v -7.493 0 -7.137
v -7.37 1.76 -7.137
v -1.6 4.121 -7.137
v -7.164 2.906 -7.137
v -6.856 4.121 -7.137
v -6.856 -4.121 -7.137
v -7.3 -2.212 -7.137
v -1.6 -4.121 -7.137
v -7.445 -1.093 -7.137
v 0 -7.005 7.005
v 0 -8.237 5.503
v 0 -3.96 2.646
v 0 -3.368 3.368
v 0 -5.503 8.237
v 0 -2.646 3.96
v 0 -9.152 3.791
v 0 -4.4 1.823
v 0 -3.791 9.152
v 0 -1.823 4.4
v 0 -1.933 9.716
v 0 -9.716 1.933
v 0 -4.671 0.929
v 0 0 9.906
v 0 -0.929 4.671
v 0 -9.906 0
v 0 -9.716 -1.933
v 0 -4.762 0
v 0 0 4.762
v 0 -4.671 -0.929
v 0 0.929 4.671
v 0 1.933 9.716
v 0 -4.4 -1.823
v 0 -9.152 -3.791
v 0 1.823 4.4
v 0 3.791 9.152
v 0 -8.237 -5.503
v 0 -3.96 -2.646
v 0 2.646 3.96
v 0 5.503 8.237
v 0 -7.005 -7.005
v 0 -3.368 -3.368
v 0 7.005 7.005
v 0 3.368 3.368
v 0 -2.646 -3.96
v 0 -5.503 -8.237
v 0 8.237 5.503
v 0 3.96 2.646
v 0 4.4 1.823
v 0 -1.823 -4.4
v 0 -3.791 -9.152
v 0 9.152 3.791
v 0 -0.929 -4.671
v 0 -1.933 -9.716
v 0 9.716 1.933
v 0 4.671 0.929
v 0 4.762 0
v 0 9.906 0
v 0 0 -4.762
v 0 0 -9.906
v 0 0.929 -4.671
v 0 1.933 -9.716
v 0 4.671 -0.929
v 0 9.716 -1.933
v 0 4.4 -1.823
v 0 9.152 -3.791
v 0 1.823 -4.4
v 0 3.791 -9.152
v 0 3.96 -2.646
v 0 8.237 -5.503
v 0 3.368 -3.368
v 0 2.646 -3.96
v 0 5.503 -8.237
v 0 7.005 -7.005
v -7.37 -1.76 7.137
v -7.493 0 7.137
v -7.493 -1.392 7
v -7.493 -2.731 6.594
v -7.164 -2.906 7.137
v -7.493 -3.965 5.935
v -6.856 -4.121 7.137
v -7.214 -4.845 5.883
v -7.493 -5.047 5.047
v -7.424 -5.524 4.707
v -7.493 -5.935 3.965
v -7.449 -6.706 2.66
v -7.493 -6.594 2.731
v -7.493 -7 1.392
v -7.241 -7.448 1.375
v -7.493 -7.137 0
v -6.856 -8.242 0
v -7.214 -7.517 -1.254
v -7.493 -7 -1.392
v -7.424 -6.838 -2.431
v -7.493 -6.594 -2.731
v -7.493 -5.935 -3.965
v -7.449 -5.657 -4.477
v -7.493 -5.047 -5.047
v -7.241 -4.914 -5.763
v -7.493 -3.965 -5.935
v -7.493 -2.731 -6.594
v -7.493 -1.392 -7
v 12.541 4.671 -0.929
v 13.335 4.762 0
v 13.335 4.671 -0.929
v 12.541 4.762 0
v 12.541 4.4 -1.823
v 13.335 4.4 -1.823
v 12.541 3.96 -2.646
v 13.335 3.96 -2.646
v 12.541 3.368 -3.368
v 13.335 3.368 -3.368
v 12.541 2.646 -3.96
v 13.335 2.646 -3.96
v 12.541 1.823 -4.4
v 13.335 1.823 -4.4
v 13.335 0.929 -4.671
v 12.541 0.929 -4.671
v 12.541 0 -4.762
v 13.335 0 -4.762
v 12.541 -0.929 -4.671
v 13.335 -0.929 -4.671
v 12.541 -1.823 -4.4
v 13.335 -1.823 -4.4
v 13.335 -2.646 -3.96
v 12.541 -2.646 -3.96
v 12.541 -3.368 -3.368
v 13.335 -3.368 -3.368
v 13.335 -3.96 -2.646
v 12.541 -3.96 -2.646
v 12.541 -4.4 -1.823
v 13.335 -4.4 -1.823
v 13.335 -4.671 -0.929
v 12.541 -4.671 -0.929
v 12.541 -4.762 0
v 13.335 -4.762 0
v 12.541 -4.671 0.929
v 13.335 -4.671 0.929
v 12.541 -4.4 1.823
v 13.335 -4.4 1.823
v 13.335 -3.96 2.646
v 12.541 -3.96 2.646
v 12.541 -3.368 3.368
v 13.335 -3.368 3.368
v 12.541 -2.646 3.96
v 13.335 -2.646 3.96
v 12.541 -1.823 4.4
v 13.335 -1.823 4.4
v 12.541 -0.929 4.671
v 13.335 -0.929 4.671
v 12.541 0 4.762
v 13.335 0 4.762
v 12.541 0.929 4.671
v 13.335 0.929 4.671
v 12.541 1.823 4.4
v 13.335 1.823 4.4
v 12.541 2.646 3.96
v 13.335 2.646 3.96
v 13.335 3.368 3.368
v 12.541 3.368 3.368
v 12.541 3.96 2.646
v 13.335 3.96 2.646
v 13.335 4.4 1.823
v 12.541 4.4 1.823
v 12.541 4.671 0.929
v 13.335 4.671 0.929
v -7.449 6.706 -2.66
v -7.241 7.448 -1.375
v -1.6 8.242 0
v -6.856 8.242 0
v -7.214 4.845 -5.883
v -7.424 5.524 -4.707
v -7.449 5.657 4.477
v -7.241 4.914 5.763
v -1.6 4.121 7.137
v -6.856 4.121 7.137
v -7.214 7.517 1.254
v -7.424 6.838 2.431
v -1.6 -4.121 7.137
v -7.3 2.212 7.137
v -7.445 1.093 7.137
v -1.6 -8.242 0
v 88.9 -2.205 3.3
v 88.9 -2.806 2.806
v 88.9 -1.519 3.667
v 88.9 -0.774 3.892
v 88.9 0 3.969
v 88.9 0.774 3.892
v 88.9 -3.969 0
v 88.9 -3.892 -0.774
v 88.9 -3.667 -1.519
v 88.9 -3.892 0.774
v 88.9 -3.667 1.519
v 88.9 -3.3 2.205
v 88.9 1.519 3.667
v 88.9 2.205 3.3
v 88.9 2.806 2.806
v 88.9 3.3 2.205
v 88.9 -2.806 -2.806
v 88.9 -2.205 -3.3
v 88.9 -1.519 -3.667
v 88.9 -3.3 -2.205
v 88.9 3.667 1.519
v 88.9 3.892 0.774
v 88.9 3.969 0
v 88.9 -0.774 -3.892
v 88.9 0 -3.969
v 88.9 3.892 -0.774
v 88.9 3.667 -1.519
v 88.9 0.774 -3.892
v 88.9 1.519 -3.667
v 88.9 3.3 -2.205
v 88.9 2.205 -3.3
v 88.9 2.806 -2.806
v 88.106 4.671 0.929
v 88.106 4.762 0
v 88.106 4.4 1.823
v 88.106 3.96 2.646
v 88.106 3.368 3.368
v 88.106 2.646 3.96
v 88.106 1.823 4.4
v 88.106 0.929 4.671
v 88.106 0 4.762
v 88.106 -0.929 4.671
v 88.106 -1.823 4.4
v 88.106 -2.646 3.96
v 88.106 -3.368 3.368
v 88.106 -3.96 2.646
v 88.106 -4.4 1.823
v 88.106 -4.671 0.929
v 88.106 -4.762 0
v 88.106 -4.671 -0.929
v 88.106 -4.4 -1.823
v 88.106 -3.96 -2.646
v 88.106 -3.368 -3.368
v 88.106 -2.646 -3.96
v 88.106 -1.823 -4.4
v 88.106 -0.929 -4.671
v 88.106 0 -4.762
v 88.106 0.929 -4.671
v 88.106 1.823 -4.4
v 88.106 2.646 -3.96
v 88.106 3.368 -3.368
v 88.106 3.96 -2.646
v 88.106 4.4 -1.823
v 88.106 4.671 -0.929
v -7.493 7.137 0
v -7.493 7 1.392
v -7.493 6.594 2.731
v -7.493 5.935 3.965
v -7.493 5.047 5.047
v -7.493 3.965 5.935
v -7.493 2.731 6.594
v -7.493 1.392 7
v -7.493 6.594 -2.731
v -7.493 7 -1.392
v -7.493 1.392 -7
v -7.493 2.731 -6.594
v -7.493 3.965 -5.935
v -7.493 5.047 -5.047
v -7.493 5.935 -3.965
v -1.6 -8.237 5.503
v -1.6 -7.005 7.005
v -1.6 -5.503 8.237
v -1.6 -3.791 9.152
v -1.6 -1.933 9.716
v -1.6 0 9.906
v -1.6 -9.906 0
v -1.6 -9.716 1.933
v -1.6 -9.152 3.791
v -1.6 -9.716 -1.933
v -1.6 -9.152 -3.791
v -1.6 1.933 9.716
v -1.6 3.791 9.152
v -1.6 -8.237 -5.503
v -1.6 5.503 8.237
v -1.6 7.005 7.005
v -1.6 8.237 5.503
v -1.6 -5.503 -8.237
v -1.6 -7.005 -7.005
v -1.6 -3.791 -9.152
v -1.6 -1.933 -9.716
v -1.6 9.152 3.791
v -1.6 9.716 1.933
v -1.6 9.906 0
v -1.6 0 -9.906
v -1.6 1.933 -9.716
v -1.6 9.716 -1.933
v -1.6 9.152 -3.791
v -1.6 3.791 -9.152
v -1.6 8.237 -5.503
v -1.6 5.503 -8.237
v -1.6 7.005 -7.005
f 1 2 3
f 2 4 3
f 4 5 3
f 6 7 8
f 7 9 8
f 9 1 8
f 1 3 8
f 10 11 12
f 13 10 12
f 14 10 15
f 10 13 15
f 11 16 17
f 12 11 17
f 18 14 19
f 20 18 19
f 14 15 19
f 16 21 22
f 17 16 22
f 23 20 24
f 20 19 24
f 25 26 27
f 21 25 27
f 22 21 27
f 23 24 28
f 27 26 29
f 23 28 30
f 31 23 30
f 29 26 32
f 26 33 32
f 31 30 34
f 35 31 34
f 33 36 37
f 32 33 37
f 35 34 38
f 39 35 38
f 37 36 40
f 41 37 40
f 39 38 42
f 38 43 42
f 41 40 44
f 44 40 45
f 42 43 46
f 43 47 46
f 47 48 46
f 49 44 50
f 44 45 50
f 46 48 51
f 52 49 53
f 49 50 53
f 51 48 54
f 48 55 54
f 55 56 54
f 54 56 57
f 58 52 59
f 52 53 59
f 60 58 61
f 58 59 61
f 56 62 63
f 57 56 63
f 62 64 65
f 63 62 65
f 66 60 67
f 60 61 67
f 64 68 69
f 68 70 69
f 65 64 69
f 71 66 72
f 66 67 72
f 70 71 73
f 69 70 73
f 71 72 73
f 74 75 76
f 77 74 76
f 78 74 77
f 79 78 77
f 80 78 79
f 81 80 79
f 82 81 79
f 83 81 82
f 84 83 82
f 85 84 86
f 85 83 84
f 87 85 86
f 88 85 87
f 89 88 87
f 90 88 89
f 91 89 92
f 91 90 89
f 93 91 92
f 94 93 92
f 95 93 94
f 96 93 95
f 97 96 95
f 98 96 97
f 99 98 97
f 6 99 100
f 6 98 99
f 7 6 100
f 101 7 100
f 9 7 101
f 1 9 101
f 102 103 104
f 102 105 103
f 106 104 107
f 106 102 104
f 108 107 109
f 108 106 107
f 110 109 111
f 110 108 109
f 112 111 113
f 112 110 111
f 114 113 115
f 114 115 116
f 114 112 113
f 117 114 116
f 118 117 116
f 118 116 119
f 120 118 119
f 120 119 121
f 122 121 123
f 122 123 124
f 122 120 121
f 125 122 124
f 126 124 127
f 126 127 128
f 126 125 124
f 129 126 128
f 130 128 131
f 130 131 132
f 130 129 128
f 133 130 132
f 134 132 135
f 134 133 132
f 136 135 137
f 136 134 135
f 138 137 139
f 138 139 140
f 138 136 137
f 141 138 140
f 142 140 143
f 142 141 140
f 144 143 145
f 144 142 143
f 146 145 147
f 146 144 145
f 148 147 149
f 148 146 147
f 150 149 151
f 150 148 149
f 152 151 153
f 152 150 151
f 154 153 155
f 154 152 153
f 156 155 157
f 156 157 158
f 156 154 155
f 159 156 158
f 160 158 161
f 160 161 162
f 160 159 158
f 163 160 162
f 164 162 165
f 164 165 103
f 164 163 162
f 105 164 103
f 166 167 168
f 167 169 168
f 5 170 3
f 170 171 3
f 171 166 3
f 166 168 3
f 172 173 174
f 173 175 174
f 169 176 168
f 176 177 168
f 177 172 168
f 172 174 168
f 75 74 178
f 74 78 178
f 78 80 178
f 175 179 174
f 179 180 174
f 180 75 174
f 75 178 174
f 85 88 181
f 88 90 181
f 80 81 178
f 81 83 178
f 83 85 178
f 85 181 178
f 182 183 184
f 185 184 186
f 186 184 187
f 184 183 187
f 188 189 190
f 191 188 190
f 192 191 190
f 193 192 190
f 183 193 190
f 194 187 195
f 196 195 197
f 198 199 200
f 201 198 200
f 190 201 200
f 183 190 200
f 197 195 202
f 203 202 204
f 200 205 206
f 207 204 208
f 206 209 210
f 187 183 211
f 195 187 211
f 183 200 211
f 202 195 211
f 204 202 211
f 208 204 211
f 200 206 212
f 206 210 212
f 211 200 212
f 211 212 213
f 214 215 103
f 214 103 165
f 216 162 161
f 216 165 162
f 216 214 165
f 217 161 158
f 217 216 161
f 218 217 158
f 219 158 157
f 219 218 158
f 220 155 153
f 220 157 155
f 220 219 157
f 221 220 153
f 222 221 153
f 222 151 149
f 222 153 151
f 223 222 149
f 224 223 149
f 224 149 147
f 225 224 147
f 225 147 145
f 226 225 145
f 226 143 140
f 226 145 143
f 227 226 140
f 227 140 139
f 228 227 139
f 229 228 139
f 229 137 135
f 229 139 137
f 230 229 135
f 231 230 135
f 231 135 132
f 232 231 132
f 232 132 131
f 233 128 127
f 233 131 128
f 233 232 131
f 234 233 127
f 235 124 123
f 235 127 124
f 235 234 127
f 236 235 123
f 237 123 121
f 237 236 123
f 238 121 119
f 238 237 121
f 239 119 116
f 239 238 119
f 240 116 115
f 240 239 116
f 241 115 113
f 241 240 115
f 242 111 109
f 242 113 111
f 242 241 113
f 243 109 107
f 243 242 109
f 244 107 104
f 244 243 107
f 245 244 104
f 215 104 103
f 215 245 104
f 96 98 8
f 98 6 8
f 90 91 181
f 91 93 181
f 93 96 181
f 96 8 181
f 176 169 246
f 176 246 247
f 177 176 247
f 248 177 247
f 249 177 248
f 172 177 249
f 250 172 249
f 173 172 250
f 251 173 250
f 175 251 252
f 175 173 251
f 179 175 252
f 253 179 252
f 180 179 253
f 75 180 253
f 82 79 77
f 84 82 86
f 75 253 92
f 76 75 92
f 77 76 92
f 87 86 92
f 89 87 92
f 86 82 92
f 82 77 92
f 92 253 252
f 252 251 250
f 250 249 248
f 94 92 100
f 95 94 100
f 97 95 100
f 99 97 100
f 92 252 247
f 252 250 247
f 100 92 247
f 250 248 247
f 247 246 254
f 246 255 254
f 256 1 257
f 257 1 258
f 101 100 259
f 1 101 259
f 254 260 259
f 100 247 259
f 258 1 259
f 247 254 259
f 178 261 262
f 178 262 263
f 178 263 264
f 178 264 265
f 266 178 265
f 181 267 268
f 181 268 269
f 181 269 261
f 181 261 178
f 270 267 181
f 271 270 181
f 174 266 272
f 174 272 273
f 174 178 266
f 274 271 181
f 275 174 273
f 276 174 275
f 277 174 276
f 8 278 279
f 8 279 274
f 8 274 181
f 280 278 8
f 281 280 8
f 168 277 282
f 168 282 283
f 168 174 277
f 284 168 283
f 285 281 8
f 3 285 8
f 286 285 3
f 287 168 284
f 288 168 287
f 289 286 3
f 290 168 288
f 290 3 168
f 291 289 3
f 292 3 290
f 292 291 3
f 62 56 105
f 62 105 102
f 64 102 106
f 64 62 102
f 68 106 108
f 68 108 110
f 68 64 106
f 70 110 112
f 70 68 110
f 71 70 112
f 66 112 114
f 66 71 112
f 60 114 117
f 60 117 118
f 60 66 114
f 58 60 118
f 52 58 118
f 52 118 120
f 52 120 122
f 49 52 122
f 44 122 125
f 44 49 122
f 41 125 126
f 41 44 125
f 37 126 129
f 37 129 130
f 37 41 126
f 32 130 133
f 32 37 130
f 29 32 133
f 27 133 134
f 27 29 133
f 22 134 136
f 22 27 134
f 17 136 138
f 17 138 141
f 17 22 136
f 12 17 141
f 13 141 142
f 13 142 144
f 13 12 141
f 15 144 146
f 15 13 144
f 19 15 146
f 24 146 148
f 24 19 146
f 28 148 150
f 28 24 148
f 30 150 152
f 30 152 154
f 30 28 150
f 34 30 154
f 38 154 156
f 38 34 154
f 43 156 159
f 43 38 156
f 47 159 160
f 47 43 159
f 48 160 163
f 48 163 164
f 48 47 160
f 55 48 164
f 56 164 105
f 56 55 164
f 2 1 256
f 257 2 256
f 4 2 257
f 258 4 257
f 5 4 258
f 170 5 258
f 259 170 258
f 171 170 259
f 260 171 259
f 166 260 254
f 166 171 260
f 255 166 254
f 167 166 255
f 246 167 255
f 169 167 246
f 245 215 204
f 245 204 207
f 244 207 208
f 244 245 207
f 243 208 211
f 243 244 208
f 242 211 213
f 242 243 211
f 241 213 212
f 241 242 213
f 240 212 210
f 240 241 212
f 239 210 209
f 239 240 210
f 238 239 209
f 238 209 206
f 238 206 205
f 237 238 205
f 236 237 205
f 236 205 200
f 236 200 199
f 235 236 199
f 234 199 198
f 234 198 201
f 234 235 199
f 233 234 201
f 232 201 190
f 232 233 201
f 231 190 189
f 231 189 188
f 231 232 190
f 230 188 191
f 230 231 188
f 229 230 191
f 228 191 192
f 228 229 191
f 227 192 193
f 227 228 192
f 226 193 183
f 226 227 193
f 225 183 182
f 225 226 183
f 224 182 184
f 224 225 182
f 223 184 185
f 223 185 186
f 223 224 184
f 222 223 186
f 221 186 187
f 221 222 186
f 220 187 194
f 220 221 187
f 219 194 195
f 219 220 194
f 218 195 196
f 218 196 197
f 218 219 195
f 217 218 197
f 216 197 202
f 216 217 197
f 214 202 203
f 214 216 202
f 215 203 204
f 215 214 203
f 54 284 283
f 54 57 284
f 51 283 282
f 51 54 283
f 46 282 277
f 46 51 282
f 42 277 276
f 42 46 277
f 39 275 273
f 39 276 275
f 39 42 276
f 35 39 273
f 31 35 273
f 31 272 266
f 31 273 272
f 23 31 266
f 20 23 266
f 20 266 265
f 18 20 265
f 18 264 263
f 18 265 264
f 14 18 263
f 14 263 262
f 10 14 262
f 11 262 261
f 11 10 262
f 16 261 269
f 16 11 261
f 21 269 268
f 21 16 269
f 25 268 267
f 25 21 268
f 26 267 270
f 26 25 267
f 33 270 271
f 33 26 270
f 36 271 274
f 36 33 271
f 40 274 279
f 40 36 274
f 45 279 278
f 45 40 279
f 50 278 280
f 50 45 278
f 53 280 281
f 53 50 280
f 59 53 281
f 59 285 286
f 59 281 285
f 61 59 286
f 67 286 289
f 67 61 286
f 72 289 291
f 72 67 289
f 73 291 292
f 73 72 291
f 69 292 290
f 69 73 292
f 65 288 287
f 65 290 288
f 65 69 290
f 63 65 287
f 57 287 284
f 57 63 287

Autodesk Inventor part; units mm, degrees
ref_plane "YZ Plane" through (0, 0, 0) normal (1, 0, 0) x (0, 1, 0)
ref_plane "XZ Plane" through (0, 0, 0) normal (0, 1, 0) x (-1, 0, 0)
sketch "Sketch1" plane through (0, 0, 0) normal (0, 0, 1) x (1, 0, 0)
  line L0 (0, 9.906) -> (0, 4.7625)
  line L1 (13.335, 4.7625) -> (88.9, 4.7625)
  line L2 (88.9, 4.7625) -> (88.9, 0)
  line L3 (88.9, 0) -> (-1.6002, 0)
  line L4 (0, -1.9812) -> (0, 11.8872) projected
  line L5 (-19.7002, 0) -> (107, 0) projected
  line L6 (-1.6002, 0) -> (-1.6002, 9.906)
  line L7 (-1.6002, 9.906) -> (0, 9.906)
  line L8 (13.335, 4.7625) -> (12.5412, 4.7625)
  line L9 (12.5412, 4.7625) -> (0, 4.7625)
  dimension "d0" = 88.9
  dimension "d1" = 75.565
  dimension "d2" = 9.525
  dimension "d8" = 1.6002
  dimension "d9" = 19.812
  dimension "d15" = 9.525
  dimension "d16" = 0.7937
revolve "Body" add sketch "Sketch1" angle 360 about axis through (88.9, 0, 0) along (-1, 0, 0)
sketch "Sketch2" plane through (0, 0, 0) normal (1, 0, 0) x (0, 0, -1)
  circle A0 centre (0, 0) radius 9.906 projected
  line L0 (0, 8.2416) -> (7.1374, 4.1208)
  line L1 (7.1374, 4.1208) -> (7.1374, -4.1208)
  line L2 (7.1374, -4.1208) -> (0, -8.2416)
  line L3 (0, -8.2416) -> (-7.1374, -4.1208)
  line L4 (-7.1374, -4.1208) -> (-7.1374, 4.1208)
  line L5 (-7.1374, 4.1208) -> (0, 8.2416)
  circle A1 centre (0, 0) radius 9.906 projected
  dimension "d10" = 14.2748
extrude "Head" add sketch "Sketch2" against normal blind 7.493 contours L0 L1 L2 L3 L4 L5
sketch "Sketch3" plane through (0, 0, 0) normal (0, 0, 1) x (1, 0, 0)
  line L0 (-7.493, 7.1374) -> (-7.493, 8.2416)
  line L1 (-7.493, 8.2416) -> (-6.8555, 8.2416)
  line L2 (-6.8555, 8.2416) -> (-7.493, 7.1374)
  line L3 (-2.8347, 8.2416) -> (-7.493, 8.2416)
  line L4 (-7.493, 8.2416) -> (-7.493, 5.9322)
  line L5 (-1.6002, 8.2416) -> (-7.493, 8.2416) projected
  line L6 (-7.493, 8.2416) -> (-7.493, 4.1208) projected
  line L7 (-8.6716, 0) -> (-0.4216, 0) projected
  dimension "d5" = 30
  dimension "d18" = 14.2748
revolve "Chamfer1" cut sketch "Sketch3" angle 360 about axis through (-10, 0, 0) along (1, 0, 0)
thread "Thread" size "3/8-16 UNC" class "2A" standard "ANSI Unified Screw Threads" length 75.565
chamfer "Chamfer2" distance 0.7938 distance2 0.7938 1 edges at (88.9, -4.7625, 0) measured on face at (88.9, 1.1883, -1.0527)
ref_plane "Work Plane1" through (3.5, 0, 0) normal (0, 0, 1) x (1, 0, 0)
equation "\"d0\" = NLG"
equation "\"d1\" = GEL"
equation "\"d2\" = GD"
equation "\"d8\" = PHH"
equation "\"d9\" = LADI"
equation "\"d15\" = BDM"
equation "\"d16\" = GAL"
equation "\"d10\" = SW"
equation "\"d3\" = KOH"
equation "\"d13\" = GEL"
equation "\"d6\" = -0.5 * SPD + 0.5 * GD"
equation "\"d7\" = -0.5 * SPD + 0.5 * GD"
equation "\"d5\" = ANG1"
equation "\"d18\" = SW0"
equation "\"NLG\" = 88.9"
equation "\"GD\" = NND"
equation "\"BDM\" = NND"
equation "\"KOH\" = 7.493"
equation "\"GEL\" = 75.565"
equation "\"LADI\" = 19.812"
equation "\"SW\" = 14.2748"
equation "\"PHH\" = 1.6002"
equation "\"SW0\" = 14.2748"
equation "\"SPD\" = GD1"
equation "\"ANG1\" = 30deg"
equation "\"GAL\" = 0.79375"
equation "\"GUL\" = GAL"
equation "\"GD1\" = 7.9375"
equation "\"THREADDIA\" = 9.525"
equation "\"SDH\" = SW"
equation "\"TOA\" = 30deg"
equation "\"RR\" = 0.09525"
equation "\"NND\" = 9.525"
equation "\"SD\" = 0"
equation "\"SD2\" = NND"
equation "\"E0\" = 16.48739"
properties part number "ANSI B18.6.3 - 3/8-16 UNC x 3.5, PHWHMSI" material "Steel, Mild"
